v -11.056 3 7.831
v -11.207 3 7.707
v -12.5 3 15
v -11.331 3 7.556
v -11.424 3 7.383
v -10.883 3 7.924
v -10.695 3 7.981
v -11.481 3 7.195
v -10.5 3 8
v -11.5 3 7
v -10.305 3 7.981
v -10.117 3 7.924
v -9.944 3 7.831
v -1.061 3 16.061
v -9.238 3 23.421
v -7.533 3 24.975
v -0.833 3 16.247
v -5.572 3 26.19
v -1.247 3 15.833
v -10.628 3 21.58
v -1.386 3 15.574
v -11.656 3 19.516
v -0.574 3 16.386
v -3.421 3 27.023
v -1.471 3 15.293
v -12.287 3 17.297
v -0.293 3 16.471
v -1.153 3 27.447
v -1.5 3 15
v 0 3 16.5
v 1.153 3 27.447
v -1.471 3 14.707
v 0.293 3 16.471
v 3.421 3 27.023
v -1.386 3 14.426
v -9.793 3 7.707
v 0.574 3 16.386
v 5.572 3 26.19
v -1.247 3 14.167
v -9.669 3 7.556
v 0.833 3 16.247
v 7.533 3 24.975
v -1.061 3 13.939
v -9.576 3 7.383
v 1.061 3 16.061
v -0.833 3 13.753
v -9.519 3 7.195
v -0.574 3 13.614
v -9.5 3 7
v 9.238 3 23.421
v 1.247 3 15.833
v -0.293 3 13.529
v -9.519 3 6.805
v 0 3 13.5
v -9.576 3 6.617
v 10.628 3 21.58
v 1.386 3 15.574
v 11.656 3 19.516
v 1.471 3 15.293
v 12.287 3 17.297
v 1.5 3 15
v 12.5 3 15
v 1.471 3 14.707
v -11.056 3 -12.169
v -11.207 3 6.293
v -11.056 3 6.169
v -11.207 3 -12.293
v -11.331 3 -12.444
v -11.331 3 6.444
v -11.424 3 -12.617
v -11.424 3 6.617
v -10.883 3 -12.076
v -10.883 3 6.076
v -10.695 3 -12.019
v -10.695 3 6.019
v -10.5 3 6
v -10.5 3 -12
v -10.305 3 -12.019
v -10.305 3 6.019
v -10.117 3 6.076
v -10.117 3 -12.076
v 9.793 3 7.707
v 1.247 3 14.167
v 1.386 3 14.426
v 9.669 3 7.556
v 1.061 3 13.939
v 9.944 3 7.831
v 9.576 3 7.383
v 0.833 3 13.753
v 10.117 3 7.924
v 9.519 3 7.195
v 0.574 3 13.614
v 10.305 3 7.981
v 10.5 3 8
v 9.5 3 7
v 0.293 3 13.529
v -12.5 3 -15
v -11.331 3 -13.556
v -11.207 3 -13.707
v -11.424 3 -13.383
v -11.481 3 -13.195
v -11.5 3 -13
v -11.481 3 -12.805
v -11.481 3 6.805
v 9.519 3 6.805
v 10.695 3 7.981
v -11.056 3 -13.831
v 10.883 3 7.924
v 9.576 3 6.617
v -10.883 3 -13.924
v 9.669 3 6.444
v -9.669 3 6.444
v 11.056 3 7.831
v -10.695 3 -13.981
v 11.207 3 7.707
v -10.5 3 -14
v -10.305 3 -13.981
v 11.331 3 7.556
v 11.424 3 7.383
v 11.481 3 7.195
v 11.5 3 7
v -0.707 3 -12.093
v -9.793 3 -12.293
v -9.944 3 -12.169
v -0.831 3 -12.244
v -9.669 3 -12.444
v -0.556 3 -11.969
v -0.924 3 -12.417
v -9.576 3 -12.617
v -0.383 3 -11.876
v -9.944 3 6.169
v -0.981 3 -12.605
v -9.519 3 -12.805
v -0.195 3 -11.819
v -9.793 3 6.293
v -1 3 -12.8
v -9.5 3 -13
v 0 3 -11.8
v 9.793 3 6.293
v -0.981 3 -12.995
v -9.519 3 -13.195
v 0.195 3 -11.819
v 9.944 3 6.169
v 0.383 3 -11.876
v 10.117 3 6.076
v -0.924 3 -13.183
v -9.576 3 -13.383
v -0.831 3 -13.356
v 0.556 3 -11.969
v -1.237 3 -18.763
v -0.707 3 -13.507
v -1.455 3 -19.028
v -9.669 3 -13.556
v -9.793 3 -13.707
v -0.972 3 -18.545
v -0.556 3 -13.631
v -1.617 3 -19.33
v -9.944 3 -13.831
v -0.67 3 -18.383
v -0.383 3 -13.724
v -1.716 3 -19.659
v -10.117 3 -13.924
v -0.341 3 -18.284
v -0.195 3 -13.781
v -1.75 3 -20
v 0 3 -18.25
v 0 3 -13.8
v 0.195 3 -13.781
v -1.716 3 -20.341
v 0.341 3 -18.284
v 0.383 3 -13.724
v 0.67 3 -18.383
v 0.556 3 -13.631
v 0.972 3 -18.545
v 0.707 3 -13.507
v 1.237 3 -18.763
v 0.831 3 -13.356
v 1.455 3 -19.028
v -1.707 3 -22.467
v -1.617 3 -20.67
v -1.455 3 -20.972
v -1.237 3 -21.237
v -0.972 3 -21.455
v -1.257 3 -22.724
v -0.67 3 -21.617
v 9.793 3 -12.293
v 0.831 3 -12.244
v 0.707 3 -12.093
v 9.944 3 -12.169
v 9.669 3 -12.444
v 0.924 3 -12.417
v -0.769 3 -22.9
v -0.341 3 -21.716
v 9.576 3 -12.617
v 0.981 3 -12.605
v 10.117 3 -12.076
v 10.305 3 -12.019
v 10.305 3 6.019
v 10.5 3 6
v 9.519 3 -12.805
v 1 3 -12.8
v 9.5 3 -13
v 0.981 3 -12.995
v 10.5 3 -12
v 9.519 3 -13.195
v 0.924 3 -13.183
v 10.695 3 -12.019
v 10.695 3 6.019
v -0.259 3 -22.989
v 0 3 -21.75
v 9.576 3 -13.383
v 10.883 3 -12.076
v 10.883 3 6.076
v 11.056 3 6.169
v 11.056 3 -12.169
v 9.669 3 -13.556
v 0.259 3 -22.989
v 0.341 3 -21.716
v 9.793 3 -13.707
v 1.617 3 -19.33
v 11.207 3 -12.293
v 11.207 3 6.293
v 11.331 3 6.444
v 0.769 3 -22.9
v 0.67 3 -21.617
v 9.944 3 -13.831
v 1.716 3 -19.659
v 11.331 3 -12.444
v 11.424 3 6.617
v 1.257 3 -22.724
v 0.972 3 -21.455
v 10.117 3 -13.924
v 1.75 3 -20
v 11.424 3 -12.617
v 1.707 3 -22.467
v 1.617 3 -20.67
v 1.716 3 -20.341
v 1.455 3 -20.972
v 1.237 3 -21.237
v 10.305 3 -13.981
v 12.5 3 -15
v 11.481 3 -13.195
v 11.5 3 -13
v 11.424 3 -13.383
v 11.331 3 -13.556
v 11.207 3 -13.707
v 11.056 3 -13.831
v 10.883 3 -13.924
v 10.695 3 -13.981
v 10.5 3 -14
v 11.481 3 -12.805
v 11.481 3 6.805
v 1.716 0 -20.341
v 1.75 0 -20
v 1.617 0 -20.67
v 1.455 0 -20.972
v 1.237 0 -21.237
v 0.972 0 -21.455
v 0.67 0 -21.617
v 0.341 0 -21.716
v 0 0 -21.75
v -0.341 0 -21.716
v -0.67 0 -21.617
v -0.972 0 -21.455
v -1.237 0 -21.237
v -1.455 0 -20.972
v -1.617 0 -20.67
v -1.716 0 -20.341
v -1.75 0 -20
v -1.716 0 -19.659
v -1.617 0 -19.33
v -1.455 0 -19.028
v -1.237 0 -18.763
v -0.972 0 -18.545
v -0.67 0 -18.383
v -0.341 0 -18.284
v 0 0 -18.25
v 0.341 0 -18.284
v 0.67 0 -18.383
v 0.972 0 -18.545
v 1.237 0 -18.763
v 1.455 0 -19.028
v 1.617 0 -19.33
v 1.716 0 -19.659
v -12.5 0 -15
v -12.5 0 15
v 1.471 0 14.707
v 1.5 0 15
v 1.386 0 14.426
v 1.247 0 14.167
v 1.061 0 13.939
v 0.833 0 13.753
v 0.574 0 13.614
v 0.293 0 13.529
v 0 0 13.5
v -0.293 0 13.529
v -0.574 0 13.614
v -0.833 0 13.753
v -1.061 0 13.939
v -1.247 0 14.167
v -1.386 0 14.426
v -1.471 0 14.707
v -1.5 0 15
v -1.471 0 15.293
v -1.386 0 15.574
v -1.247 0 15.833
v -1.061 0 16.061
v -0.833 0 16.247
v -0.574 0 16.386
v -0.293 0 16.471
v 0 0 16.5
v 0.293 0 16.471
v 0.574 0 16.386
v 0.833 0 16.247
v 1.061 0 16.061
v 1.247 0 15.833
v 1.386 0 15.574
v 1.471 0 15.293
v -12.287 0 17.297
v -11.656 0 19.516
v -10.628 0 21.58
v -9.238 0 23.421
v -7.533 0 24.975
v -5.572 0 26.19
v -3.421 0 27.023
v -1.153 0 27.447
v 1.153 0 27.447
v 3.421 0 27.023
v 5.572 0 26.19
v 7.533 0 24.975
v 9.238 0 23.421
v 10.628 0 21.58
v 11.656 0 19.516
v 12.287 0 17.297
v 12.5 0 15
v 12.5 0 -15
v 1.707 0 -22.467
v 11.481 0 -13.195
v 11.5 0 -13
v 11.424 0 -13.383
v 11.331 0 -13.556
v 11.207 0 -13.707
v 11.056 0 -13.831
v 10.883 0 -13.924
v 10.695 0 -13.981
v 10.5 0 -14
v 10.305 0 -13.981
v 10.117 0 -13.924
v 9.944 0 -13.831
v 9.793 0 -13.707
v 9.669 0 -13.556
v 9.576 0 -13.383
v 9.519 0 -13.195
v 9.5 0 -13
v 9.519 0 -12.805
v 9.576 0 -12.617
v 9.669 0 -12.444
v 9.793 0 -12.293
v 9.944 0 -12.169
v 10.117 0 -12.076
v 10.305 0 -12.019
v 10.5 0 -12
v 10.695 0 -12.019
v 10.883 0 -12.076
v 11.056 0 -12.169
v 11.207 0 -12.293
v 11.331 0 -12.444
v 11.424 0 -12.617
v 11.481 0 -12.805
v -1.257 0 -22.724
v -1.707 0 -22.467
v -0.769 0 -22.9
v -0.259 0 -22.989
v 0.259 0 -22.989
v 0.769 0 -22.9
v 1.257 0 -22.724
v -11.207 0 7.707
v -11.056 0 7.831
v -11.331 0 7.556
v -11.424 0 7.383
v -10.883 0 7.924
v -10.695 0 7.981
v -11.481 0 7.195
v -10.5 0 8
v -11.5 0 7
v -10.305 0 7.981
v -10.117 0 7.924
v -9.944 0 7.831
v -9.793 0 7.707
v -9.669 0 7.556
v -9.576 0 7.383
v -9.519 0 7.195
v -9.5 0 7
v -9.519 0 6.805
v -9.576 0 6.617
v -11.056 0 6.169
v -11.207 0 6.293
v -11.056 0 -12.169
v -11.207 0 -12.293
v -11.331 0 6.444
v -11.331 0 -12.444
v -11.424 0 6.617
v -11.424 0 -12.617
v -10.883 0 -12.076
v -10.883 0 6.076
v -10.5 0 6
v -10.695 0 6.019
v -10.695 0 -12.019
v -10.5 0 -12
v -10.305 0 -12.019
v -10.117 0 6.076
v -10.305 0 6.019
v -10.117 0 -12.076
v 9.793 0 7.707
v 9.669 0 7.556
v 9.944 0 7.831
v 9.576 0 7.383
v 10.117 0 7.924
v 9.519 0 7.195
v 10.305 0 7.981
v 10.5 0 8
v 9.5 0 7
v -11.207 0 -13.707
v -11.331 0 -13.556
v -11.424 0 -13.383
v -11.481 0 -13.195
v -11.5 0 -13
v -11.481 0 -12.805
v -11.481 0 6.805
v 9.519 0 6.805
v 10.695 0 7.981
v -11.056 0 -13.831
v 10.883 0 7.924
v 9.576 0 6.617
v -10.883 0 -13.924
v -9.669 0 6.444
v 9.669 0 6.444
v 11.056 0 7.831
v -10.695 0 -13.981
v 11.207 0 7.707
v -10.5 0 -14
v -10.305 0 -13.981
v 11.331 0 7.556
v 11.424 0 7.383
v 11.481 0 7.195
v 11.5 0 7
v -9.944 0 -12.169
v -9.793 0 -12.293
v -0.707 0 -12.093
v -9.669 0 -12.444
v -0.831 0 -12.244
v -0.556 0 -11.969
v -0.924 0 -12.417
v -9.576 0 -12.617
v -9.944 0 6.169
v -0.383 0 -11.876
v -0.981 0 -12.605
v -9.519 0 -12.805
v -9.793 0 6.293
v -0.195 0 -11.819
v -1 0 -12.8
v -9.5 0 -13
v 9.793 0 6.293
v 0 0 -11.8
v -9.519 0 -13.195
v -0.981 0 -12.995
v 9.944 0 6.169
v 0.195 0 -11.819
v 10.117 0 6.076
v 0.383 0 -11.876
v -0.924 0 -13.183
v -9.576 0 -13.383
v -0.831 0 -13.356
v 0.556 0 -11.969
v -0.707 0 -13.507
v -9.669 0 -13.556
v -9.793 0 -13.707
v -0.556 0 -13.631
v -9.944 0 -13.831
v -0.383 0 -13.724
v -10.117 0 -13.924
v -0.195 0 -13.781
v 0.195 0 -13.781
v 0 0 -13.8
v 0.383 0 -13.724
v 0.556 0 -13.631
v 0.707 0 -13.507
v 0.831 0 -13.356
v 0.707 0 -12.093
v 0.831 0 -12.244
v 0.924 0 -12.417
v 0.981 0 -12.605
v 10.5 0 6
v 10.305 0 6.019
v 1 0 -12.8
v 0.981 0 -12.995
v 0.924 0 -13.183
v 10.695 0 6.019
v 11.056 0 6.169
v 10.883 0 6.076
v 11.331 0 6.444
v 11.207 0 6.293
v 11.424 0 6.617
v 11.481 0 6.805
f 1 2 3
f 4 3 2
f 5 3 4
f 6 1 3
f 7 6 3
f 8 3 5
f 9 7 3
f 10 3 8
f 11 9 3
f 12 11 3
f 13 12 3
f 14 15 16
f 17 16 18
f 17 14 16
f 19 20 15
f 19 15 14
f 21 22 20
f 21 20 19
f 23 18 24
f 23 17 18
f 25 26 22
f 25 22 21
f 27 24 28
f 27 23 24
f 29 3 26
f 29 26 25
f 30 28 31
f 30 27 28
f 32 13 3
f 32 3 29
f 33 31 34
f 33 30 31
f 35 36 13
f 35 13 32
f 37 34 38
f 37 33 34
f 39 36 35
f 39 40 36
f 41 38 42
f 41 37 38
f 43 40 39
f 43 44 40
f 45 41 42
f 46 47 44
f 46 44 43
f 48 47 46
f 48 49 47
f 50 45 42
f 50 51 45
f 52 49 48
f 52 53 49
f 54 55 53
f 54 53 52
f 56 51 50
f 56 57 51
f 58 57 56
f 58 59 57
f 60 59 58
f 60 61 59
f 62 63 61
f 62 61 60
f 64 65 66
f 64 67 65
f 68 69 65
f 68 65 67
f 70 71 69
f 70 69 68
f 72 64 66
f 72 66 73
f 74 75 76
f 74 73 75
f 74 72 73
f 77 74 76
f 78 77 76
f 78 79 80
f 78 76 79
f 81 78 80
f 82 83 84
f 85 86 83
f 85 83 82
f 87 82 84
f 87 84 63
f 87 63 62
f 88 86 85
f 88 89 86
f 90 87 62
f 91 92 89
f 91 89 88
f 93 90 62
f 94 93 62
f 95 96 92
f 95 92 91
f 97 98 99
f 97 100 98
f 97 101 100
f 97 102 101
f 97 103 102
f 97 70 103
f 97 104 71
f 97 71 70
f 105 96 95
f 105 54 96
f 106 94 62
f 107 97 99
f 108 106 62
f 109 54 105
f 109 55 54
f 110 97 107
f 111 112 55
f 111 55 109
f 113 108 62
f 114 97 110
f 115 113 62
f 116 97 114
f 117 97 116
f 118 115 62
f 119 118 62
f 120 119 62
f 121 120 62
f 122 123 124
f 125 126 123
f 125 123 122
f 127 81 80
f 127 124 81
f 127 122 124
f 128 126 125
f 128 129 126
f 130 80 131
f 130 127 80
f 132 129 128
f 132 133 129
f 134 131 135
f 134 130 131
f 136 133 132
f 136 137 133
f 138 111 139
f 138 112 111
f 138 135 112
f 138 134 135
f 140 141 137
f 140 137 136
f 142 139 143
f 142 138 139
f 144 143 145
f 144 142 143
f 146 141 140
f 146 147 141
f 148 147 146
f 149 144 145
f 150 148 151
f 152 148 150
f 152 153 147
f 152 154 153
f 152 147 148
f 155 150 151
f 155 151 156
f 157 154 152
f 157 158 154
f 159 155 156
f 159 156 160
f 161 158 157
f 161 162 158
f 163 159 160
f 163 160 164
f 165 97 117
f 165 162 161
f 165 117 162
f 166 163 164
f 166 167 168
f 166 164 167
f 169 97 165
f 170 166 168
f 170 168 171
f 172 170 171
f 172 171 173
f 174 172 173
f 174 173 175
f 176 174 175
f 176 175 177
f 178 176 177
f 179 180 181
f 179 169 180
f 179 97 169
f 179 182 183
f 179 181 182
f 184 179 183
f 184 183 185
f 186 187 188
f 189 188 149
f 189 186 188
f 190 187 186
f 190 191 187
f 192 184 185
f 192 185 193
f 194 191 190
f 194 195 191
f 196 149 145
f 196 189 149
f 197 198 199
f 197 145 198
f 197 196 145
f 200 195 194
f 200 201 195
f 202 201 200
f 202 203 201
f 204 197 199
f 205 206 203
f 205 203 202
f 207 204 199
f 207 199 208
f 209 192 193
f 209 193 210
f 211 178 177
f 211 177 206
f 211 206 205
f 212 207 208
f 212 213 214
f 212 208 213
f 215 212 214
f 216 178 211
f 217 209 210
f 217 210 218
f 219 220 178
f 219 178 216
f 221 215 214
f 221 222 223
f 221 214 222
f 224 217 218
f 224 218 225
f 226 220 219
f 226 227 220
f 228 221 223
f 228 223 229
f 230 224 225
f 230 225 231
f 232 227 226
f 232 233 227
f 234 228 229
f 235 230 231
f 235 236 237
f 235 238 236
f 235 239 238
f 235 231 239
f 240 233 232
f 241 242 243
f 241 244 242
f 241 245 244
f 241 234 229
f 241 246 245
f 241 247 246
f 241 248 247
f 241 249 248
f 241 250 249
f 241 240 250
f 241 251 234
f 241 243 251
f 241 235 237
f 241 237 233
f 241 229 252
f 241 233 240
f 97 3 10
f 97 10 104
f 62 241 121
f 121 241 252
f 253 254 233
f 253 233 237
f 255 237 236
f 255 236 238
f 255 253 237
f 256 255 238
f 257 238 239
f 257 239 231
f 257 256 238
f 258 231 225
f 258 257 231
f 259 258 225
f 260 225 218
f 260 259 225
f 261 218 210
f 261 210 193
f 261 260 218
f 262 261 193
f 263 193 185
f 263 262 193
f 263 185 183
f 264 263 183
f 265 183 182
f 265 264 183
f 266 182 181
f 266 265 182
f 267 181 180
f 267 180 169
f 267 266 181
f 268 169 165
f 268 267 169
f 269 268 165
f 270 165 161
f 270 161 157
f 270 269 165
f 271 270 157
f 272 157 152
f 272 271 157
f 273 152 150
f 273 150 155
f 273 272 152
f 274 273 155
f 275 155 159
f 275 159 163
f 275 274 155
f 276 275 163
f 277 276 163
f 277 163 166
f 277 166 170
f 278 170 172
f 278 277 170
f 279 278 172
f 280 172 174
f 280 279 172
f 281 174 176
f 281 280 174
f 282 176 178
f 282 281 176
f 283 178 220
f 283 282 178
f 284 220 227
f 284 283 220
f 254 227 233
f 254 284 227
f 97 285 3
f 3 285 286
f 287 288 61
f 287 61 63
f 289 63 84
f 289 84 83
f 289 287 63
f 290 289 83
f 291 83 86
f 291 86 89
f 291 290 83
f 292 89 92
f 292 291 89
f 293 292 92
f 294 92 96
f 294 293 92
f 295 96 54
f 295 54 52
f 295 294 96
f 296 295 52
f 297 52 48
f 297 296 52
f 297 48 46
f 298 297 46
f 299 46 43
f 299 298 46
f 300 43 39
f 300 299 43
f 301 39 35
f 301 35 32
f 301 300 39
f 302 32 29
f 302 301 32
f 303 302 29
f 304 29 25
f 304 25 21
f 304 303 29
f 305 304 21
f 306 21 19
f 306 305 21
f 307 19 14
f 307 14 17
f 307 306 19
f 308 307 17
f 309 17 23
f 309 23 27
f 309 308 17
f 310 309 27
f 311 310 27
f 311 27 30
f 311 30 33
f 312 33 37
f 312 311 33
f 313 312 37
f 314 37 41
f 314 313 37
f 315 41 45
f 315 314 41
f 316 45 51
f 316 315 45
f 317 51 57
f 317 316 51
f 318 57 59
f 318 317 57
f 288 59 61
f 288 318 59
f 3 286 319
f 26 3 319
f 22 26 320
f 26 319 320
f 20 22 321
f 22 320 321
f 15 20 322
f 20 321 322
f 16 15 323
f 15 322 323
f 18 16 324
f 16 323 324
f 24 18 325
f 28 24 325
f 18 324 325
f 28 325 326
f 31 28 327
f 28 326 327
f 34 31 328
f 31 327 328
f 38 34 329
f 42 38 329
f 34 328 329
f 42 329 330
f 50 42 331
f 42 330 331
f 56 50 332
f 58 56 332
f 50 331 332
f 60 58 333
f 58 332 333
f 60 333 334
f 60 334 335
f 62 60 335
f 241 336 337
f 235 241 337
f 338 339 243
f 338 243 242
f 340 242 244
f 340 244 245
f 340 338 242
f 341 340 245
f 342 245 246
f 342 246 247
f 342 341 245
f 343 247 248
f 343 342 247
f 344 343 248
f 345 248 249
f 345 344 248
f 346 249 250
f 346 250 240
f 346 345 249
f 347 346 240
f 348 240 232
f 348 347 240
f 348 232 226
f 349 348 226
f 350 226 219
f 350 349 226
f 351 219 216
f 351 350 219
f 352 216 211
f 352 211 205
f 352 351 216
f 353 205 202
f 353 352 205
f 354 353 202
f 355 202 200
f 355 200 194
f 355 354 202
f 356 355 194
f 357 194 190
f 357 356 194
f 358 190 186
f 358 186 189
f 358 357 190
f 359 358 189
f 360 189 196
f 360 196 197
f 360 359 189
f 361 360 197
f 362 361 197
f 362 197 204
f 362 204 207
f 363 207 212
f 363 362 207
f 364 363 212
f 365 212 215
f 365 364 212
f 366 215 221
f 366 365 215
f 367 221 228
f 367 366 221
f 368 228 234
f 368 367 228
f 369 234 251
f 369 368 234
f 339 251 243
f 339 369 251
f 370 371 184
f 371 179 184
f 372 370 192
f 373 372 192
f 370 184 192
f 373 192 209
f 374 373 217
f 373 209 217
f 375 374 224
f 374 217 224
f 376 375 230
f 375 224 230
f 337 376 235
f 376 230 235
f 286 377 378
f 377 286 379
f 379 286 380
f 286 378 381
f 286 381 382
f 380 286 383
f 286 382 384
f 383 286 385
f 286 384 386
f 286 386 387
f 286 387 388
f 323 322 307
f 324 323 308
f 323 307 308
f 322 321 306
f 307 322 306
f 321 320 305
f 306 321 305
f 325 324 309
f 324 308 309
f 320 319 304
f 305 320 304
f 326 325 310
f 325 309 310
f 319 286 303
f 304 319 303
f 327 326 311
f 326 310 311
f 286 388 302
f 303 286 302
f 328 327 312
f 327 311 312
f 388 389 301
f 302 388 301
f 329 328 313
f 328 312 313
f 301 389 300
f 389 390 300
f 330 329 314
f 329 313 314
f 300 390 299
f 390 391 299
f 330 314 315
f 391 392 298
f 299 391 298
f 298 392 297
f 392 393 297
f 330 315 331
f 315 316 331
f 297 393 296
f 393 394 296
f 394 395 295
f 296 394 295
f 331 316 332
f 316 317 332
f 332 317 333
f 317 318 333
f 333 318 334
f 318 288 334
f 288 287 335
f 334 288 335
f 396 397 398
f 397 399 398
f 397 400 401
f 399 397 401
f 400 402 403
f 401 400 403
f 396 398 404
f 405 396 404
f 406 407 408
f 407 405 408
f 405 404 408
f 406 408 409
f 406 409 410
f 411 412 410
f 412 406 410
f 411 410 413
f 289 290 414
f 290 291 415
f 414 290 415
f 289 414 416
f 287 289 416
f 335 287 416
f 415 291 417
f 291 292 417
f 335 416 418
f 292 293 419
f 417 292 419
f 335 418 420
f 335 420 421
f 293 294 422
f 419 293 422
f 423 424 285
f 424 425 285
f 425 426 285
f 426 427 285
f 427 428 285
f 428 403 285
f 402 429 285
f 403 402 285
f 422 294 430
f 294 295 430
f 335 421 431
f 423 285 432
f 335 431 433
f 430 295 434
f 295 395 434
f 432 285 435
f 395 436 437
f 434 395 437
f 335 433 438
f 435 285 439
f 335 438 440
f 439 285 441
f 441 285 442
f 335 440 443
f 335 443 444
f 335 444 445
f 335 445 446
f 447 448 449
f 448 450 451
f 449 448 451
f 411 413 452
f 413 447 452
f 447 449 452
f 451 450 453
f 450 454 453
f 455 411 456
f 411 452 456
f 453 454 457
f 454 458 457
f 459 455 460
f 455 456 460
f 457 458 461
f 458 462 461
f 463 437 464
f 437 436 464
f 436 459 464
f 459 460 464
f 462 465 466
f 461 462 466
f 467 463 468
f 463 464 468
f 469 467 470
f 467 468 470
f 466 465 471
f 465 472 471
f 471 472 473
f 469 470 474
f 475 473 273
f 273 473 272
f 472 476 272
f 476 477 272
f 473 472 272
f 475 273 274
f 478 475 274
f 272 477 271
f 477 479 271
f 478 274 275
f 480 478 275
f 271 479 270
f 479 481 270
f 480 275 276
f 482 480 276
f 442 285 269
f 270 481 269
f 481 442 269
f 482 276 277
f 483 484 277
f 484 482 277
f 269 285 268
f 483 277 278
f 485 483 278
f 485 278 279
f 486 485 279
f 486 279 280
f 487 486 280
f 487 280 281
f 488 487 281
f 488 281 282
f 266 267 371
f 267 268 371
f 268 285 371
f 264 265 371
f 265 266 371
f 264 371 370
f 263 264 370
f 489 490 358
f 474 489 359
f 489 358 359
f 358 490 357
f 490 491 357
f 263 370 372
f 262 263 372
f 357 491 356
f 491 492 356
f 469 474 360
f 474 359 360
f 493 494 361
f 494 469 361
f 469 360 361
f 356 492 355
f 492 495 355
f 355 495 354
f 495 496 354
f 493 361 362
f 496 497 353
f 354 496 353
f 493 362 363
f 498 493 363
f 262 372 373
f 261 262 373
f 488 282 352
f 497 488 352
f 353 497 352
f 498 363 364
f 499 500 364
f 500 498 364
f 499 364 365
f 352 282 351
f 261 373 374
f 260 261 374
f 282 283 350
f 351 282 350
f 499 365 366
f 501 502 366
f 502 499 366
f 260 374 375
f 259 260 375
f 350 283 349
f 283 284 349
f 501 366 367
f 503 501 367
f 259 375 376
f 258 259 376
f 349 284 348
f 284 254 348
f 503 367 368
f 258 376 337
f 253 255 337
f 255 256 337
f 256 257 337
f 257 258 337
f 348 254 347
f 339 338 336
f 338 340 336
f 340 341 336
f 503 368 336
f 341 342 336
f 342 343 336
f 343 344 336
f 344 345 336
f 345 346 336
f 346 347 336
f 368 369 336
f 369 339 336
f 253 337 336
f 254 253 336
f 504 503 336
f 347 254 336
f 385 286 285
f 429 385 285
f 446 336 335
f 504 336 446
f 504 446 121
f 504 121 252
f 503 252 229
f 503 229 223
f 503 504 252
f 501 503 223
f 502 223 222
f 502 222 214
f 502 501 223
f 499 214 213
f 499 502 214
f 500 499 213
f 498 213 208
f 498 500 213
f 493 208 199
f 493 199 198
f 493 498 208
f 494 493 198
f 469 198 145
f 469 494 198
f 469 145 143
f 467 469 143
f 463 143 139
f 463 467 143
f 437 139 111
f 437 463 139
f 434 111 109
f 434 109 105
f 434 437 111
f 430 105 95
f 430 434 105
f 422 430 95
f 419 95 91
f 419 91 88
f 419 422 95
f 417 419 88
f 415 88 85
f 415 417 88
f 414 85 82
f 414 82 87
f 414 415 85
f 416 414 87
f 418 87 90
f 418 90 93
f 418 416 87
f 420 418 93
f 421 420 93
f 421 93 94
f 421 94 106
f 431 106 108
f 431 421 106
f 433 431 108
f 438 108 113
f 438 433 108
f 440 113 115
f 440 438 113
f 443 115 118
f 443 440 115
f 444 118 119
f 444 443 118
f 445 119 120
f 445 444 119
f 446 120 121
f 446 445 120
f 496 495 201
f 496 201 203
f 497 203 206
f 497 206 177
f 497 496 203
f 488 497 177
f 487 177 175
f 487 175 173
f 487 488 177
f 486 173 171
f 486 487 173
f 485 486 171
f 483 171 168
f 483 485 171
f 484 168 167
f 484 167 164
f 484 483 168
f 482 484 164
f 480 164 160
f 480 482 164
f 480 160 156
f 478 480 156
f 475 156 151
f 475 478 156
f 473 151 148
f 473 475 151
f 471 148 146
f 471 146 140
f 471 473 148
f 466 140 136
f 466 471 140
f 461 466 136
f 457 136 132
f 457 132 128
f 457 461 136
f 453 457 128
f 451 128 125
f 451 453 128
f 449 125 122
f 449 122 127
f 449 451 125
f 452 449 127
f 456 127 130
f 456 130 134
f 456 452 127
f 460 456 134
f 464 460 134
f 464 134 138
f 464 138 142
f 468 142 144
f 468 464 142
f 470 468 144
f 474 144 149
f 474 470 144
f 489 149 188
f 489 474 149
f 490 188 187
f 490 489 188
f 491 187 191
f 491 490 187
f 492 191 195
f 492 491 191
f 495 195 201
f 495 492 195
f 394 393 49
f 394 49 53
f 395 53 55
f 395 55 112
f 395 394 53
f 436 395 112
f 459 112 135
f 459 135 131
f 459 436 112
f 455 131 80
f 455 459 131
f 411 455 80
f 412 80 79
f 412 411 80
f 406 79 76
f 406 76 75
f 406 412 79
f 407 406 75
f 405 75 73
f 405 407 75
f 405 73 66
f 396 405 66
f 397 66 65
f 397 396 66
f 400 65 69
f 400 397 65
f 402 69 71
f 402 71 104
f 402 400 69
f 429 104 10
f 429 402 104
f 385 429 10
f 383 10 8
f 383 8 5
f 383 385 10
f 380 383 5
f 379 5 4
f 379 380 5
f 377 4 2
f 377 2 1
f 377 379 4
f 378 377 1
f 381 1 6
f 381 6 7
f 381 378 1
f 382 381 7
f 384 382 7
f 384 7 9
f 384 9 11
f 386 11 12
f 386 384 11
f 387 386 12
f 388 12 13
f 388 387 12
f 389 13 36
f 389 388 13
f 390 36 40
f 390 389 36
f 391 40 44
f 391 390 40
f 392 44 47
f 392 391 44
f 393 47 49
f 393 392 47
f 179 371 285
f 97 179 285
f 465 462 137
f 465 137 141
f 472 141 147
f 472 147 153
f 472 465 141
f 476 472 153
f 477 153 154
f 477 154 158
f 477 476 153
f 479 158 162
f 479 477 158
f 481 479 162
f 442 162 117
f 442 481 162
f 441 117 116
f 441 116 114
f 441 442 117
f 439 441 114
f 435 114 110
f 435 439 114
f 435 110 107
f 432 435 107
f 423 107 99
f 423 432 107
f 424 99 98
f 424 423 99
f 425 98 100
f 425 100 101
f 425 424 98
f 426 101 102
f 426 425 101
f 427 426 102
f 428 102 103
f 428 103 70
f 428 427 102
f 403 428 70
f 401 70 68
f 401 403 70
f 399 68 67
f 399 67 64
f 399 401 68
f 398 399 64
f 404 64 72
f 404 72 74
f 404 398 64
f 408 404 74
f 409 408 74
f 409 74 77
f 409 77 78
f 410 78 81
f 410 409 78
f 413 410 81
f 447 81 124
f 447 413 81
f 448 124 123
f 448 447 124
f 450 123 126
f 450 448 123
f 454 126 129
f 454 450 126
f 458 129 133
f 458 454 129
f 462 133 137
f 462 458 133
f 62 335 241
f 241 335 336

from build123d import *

# Parameters (mm, degrees)
SKETCH_1_R      = 1
SKETCH_1_R_2    = 1.5
SKETCH_1_R_3    = 1.75
EXTRUDE_1_DEPTH = 3
FILLET_1_R      = 3


with BuildPart() as part:
    # 草图1 → 凸台-拉伸1 (new body)
    with BuildSketch(Plane(origin=(0, 0, 0), x_dir=(1, 0, 0), z_dir=(0, 1, 0))):
        with BuildLine():
            Line((-12.5, 15), (-12.5, -15))
            ThreePointArc((-12.5, -15), (0, -27.5), (12.5, -15))
            Line((12.5, -15), (12.5, 15))
            Line((12.5, 15), (0, 23.647980836))
            Line((0, 23.647980836), (-12.5, 15))
        make_face()
        with Locations((-10.5, 13)):
            Circle(SKETCH_1_R, mode=Mode.SUBTRACT)
        with Locations((10.5, 13)):
            Circle(SKETCH_1_R, mode=Mode.SUBTRACT)
        with Locations((0, -15)):
            Circle(SKETCH_1_R_2, mode=Mode.SUBTRACT)
        with Locations((-10.5, -7)):
            Circle(SKETCH_1_R, mode=Mode.SUBTRACT)
        with Locations((10.5, -7)):
            Circle(SKETCH_1_R, mode=Mode.SUBTRACT)
        with Locations((0, 12.8)):
            Circle(SKETCH_1_R, mode=Mode.SUBTRACT)
        with Locations((0, 20)):
            Circle(SKETCH_1_R_3, mode=Mode.SUBTRACT)
    extrude(amount=EXTRUDE_1_DEPTH)

    # 圆角1
    fillet_1_edges = [part.edges().sort_by_distance(p)[0] for p in [
        (0, 1.5, -23.647980836),
    ]]
    fillet(fillet_1_edges, radius=FILLET_1_R)


solid = part.part
